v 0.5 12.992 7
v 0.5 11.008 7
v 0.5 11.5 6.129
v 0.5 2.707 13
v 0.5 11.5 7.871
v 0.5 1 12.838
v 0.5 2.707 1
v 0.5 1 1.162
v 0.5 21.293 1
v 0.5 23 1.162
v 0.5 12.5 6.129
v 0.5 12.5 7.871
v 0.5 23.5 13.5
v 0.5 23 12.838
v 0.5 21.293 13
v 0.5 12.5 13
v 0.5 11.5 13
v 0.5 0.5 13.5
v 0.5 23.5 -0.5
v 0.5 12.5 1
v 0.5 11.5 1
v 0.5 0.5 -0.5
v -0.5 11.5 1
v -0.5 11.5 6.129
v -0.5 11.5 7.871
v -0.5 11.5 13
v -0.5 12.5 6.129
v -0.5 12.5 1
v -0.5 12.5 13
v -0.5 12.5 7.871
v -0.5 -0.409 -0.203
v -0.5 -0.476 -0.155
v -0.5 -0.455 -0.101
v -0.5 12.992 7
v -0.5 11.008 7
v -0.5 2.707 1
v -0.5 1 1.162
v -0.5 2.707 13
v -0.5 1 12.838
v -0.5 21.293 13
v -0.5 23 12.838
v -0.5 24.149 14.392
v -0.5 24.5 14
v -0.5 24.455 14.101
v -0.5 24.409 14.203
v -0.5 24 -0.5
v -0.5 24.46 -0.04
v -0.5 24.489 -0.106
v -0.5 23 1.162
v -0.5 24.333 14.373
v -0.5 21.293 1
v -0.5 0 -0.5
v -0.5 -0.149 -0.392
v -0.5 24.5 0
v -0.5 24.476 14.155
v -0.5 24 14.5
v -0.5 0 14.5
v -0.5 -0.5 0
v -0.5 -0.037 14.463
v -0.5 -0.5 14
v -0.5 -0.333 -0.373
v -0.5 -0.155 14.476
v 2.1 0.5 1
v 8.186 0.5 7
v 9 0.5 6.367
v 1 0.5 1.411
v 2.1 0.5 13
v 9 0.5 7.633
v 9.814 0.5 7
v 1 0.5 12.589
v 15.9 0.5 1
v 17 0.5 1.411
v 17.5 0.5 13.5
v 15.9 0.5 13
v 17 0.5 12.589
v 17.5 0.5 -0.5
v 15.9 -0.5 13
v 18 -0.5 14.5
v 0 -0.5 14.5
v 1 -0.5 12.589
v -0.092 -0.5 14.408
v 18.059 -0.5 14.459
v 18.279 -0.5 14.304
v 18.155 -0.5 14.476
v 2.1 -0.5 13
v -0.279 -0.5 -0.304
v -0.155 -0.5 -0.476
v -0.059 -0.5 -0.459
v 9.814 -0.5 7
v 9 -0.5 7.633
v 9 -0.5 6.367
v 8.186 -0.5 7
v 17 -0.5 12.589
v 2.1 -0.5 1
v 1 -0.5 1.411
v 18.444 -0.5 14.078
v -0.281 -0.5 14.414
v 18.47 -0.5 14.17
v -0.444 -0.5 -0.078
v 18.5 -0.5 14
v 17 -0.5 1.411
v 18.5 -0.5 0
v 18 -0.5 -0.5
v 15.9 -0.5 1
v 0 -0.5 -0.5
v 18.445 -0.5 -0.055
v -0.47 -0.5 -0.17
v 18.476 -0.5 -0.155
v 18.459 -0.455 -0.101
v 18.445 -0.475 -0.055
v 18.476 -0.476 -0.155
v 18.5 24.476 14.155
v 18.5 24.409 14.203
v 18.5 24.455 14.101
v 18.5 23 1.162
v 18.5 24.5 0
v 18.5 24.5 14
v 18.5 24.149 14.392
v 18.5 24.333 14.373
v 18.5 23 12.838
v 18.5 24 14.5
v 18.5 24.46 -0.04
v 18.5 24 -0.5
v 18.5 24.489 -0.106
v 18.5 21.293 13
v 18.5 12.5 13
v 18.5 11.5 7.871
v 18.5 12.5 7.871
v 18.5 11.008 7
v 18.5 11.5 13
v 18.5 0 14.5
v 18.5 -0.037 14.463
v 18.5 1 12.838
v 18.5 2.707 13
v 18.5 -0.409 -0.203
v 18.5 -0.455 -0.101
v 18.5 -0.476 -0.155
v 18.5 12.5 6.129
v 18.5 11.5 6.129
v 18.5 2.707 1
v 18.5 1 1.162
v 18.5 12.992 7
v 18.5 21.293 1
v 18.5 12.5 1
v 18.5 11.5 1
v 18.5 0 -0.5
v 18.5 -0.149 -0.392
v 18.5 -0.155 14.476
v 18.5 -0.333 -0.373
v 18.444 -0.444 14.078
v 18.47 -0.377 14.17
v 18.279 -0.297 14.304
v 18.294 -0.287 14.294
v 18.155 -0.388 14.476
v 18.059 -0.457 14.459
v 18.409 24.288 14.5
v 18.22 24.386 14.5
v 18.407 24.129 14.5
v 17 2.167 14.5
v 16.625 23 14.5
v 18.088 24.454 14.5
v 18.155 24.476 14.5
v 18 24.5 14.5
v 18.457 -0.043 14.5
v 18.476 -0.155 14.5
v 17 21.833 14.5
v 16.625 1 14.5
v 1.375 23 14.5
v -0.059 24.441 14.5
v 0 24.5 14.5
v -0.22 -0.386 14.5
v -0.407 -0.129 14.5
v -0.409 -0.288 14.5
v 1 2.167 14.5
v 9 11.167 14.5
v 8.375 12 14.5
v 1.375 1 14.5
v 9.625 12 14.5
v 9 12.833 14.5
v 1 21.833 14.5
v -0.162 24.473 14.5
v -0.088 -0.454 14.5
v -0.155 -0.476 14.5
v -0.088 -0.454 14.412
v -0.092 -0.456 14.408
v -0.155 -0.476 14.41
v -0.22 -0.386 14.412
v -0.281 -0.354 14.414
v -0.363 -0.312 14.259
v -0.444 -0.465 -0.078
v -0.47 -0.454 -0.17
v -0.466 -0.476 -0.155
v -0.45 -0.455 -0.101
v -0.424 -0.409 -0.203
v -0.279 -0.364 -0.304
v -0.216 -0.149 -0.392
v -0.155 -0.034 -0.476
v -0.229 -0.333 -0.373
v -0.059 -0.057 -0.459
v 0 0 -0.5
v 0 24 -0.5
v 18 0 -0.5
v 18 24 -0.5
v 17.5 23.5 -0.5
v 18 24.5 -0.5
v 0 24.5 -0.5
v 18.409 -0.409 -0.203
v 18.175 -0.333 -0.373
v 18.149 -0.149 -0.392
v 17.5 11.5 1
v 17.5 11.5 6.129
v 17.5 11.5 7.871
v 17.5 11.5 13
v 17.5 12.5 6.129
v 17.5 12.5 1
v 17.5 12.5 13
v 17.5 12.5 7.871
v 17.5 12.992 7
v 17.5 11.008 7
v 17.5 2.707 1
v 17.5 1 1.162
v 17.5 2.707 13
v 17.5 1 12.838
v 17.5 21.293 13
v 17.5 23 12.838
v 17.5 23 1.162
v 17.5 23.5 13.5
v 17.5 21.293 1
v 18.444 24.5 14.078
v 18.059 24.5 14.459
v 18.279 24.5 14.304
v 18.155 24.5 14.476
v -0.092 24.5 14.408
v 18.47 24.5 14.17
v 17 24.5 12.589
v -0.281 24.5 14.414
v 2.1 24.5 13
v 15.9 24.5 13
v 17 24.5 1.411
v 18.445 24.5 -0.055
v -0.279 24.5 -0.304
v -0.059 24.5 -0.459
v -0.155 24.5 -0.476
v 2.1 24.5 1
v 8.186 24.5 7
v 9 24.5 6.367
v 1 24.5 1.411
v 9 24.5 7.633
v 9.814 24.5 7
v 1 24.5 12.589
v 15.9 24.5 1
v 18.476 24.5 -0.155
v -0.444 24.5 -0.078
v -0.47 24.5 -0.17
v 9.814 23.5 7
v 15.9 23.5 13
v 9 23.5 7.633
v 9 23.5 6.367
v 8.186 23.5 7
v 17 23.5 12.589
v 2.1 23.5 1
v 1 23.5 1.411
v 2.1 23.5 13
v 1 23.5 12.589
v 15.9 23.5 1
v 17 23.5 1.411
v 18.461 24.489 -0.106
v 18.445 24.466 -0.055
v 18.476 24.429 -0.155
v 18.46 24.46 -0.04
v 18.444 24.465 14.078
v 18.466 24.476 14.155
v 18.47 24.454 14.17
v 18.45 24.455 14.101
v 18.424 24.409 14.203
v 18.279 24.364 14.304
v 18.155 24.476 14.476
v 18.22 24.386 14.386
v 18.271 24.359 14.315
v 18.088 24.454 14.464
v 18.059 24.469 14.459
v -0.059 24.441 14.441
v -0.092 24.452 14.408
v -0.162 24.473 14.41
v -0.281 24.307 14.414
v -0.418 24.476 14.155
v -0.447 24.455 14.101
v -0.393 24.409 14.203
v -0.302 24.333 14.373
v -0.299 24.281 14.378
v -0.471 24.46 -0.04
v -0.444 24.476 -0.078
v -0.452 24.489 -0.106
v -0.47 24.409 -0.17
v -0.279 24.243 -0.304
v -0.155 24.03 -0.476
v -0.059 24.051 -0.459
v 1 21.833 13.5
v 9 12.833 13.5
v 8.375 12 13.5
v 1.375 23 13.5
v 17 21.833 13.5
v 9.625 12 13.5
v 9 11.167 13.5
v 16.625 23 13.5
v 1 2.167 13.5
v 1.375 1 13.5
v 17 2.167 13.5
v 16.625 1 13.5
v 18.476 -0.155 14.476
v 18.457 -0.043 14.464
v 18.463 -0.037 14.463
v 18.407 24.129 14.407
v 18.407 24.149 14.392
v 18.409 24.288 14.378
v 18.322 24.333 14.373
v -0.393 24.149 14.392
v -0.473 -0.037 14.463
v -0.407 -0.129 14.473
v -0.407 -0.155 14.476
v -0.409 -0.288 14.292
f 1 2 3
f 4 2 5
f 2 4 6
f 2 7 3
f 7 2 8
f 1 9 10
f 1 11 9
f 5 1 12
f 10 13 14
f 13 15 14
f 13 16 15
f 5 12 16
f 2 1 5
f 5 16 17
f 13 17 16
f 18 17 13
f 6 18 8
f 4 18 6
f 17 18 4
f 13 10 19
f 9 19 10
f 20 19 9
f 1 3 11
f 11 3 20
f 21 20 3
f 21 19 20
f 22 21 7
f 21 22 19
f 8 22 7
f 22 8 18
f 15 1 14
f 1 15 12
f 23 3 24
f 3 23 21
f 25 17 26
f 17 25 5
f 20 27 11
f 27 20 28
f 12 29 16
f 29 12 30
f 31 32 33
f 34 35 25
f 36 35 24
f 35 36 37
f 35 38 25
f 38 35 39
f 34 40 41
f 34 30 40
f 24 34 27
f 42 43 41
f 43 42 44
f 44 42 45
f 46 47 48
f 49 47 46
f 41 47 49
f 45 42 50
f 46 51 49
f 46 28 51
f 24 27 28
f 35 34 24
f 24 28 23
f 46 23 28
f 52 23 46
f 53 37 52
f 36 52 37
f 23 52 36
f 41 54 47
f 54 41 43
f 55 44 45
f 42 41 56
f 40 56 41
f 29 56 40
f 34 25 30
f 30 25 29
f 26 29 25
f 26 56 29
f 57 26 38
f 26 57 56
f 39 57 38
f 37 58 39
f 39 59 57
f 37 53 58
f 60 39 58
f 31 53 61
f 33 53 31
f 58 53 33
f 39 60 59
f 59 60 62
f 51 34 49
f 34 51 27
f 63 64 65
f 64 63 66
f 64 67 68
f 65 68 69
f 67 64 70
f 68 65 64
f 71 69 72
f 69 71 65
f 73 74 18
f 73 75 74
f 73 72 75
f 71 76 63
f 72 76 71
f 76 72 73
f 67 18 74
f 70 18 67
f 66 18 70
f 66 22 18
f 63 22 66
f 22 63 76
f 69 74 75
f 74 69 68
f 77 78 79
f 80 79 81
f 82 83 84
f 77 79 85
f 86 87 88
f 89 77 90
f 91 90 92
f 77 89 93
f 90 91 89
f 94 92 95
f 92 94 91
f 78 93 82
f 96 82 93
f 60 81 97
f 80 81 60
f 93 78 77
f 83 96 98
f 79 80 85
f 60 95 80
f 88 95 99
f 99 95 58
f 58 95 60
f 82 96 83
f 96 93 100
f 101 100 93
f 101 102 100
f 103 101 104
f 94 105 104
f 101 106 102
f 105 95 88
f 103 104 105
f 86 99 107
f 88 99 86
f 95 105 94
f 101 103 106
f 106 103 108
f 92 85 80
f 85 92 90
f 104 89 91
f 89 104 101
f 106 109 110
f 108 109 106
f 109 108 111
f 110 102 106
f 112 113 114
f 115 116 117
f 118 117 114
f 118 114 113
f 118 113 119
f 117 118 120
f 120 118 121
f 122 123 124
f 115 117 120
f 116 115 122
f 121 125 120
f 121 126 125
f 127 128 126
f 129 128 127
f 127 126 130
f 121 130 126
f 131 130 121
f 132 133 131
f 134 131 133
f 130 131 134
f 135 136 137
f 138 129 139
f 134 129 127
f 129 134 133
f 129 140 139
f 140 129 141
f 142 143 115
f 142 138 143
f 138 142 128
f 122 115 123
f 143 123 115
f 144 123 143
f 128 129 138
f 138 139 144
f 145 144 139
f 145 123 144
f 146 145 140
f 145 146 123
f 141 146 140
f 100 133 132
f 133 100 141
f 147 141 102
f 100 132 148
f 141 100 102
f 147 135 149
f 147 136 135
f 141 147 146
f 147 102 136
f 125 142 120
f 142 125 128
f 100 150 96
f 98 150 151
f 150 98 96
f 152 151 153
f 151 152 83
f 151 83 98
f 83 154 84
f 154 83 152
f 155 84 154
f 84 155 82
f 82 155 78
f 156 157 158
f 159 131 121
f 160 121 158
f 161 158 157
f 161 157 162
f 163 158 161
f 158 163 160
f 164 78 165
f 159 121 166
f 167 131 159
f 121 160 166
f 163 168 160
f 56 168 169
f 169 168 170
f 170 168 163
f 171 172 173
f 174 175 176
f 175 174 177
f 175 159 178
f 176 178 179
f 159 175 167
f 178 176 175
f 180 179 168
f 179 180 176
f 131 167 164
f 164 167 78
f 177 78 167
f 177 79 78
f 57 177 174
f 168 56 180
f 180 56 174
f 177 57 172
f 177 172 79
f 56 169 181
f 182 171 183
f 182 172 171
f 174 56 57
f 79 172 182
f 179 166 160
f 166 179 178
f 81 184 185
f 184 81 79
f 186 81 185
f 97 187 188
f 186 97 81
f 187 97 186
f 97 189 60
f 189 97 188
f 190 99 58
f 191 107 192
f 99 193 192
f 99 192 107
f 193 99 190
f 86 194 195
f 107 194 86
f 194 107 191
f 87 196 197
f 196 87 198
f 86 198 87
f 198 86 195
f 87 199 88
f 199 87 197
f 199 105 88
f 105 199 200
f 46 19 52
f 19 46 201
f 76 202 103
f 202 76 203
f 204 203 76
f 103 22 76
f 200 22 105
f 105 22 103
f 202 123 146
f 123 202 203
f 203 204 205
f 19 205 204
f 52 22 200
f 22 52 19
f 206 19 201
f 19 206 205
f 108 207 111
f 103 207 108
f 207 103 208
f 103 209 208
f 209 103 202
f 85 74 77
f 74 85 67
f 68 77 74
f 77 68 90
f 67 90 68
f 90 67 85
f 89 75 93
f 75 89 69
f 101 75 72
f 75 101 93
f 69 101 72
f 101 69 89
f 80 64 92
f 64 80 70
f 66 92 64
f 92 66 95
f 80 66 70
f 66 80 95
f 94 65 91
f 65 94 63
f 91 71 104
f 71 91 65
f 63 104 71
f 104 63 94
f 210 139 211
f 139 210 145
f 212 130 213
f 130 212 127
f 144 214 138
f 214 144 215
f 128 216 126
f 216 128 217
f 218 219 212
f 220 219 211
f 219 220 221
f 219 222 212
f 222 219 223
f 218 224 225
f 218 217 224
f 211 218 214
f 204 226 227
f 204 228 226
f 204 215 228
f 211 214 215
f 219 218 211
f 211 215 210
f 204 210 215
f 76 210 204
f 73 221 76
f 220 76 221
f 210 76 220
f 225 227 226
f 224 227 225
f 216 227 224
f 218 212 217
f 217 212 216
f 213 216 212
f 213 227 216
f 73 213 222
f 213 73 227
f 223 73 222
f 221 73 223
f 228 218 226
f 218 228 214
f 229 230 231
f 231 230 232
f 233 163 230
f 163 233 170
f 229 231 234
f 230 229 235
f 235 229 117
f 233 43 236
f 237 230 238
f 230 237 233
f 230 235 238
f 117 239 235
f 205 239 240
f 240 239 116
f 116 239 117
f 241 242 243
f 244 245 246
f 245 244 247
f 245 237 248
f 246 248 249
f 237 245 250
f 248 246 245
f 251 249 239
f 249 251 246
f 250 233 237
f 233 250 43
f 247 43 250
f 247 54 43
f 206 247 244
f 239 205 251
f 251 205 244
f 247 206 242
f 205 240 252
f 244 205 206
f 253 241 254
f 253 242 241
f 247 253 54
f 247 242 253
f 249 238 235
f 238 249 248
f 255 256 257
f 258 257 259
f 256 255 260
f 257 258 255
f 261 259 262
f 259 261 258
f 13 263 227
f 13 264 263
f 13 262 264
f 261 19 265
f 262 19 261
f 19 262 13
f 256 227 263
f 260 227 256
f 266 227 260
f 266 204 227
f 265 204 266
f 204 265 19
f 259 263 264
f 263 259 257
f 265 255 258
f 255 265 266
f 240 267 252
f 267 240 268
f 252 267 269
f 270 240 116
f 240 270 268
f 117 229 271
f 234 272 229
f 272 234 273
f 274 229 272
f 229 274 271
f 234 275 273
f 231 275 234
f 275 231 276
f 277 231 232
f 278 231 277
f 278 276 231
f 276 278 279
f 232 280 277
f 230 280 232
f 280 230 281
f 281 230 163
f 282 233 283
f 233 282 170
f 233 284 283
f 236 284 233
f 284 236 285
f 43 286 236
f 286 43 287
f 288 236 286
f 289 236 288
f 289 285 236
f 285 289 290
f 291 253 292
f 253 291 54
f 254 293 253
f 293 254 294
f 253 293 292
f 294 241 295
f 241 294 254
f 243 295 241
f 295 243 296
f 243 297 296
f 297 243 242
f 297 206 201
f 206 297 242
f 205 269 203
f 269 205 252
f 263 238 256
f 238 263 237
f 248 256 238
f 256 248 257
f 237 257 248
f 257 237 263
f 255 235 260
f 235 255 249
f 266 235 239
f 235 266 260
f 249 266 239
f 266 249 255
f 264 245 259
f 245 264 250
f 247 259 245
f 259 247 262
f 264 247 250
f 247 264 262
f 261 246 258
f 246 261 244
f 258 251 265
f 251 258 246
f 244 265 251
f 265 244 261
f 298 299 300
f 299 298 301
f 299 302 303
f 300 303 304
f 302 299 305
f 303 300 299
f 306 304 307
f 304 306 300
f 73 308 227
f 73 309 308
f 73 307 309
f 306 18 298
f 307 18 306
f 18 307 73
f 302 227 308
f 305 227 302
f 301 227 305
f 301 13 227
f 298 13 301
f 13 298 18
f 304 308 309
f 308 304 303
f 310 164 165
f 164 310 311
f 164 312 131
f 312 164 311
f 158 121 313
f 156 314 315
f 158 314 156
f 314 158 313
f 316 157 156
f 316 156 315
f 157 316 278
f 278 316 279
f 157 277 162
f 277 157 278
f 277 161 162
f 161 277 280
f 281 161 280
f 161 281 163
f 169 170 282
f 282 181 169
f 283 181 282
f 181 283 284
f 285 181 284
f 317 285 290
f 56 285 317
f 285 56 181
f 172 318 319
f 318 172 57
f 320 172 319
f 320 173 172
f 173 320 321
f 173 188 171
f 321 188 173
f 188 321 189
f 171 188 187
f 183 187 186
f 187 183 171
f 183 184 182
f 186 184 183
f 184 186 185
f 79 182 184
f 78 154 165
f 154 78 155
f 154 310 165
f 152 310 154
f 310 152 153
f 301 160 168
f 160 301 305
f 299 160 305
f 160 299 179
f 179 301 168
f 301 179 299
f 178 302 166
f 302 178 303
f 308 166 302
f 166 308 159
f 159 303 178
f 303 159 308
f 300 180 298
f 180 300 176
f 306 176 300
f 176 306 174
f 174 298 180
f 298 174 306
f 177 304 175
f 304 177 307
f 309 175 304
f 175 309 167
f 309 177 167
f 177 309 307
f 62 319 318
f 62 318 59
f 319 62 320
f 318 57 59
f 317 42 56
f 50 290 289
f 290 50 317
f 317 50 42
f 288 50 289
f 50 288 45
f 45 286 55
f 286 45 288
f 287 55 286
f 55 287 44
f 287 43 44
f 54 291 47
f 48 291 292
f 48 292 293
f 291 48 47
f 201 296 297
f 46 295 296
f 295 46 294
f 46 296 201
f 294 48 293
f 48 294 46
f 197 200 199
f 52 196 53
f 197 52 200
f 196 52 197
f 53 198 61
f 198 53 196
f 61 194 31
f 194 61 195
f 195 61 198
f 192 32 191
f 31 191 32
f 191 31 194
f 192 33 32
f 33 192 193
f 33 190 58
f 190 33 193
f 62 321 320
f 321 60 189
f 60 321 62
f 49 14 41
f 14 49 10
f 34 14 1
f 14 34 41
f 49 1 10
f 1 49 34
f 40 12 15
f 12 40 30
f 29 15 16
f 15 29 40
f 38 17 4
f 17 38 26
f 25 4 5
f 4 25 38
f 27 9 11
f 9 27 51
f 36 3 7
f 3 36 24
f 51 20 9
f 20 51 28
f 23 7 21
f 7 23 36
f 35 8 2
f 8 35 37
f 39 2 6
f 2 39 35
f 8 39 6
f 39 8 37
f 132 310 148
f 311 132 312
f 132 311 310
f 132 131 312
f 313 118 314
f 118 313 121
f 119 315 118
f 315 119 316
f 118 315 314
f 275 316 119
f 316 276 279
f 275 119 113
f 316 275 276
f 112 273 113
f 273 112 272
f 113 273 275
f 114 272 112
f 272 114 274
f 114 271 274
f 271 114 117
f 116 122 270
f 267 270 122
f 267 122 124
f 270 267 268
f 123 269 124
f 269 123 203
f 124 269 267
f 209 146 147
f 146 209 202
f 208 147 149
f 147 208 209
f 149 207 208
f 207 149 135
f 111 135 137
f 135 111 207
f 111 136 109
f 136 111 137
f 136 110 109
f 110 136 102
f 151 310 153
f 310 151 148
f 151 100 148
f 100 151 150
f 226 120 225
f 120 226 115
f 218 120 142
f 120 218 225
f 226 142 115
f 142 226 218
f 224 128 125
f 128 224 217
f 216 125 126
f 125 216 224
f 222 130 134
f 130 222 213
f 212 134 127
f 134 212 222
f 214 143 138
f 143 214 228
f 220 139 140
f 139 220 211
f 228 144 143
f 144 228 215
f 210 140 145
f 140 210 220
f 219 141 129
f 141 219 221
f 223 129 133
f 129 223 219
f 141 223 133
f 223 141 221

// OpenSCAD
module support(width, length) {
    linear_extrude(1, center=true) {
    union() {
        difference() {
            polygon([[0,0],[0,width], [length,width], [length,0]]);
            offset(-1) {
                polygon([[0,0],[0,width], [length,width], [length,0]]);
            }
        }

        difference() {
                offset(.5) {
                polygon([[0,0],[0,width], [length,0]]);
            };
            offset(-.5) {
                polygon([[0,0],[0,width], [length,0]]);
            };
        }

        difference() {
                offset(.5) {
                polygon([[0,0],[length,width], [length,0]]);
            };
            offset(-.5) {
                polygon([[0,0],[length,width], [length,0]]);
            };
        }
        
        difference() {
                offset(.5) {
                polygon([[0,0],[0,width], [length,0]]);
            };
            offset(-.5) {
                polygon([[0,0],[0,width], [length,0]]);
            };
        }

        difference() {
                offset(.5) {
                polygon([[0,0],[0,width], [length,width]]);
            };
            offset(-.5) {
                polygon([[0,0],[0,width], [length,width]]);
            };
        }

    }
}
}

module crate(width, length, height, openface = false, widthsupports = true) {
    if (openface) {
        support(width, length);
    }
    translate([0, 0, height]) {
        support(width, length);
    }

    rotate([90,0,0]){
        if (widthsupports) {
            translate([0, height/2, -width/2]) cube([1,height,1], center=true);
        }
        support(height, length);
    }
    translate([0, width, 0]) rotate([90,0,0]){
        if (widthsupports) {
            translate([length, height/2, width/2]) cube([1,height,1], center=true);
        }
        support(height, length);
    }
    rotate([0,-90,0]){
        support(width, height);
    }
    translate([length, 0, 0]) rotate([0,-90,0]){
        support(width, height);
    }
}

crate(24, 18, 14, widthsupports=true);
